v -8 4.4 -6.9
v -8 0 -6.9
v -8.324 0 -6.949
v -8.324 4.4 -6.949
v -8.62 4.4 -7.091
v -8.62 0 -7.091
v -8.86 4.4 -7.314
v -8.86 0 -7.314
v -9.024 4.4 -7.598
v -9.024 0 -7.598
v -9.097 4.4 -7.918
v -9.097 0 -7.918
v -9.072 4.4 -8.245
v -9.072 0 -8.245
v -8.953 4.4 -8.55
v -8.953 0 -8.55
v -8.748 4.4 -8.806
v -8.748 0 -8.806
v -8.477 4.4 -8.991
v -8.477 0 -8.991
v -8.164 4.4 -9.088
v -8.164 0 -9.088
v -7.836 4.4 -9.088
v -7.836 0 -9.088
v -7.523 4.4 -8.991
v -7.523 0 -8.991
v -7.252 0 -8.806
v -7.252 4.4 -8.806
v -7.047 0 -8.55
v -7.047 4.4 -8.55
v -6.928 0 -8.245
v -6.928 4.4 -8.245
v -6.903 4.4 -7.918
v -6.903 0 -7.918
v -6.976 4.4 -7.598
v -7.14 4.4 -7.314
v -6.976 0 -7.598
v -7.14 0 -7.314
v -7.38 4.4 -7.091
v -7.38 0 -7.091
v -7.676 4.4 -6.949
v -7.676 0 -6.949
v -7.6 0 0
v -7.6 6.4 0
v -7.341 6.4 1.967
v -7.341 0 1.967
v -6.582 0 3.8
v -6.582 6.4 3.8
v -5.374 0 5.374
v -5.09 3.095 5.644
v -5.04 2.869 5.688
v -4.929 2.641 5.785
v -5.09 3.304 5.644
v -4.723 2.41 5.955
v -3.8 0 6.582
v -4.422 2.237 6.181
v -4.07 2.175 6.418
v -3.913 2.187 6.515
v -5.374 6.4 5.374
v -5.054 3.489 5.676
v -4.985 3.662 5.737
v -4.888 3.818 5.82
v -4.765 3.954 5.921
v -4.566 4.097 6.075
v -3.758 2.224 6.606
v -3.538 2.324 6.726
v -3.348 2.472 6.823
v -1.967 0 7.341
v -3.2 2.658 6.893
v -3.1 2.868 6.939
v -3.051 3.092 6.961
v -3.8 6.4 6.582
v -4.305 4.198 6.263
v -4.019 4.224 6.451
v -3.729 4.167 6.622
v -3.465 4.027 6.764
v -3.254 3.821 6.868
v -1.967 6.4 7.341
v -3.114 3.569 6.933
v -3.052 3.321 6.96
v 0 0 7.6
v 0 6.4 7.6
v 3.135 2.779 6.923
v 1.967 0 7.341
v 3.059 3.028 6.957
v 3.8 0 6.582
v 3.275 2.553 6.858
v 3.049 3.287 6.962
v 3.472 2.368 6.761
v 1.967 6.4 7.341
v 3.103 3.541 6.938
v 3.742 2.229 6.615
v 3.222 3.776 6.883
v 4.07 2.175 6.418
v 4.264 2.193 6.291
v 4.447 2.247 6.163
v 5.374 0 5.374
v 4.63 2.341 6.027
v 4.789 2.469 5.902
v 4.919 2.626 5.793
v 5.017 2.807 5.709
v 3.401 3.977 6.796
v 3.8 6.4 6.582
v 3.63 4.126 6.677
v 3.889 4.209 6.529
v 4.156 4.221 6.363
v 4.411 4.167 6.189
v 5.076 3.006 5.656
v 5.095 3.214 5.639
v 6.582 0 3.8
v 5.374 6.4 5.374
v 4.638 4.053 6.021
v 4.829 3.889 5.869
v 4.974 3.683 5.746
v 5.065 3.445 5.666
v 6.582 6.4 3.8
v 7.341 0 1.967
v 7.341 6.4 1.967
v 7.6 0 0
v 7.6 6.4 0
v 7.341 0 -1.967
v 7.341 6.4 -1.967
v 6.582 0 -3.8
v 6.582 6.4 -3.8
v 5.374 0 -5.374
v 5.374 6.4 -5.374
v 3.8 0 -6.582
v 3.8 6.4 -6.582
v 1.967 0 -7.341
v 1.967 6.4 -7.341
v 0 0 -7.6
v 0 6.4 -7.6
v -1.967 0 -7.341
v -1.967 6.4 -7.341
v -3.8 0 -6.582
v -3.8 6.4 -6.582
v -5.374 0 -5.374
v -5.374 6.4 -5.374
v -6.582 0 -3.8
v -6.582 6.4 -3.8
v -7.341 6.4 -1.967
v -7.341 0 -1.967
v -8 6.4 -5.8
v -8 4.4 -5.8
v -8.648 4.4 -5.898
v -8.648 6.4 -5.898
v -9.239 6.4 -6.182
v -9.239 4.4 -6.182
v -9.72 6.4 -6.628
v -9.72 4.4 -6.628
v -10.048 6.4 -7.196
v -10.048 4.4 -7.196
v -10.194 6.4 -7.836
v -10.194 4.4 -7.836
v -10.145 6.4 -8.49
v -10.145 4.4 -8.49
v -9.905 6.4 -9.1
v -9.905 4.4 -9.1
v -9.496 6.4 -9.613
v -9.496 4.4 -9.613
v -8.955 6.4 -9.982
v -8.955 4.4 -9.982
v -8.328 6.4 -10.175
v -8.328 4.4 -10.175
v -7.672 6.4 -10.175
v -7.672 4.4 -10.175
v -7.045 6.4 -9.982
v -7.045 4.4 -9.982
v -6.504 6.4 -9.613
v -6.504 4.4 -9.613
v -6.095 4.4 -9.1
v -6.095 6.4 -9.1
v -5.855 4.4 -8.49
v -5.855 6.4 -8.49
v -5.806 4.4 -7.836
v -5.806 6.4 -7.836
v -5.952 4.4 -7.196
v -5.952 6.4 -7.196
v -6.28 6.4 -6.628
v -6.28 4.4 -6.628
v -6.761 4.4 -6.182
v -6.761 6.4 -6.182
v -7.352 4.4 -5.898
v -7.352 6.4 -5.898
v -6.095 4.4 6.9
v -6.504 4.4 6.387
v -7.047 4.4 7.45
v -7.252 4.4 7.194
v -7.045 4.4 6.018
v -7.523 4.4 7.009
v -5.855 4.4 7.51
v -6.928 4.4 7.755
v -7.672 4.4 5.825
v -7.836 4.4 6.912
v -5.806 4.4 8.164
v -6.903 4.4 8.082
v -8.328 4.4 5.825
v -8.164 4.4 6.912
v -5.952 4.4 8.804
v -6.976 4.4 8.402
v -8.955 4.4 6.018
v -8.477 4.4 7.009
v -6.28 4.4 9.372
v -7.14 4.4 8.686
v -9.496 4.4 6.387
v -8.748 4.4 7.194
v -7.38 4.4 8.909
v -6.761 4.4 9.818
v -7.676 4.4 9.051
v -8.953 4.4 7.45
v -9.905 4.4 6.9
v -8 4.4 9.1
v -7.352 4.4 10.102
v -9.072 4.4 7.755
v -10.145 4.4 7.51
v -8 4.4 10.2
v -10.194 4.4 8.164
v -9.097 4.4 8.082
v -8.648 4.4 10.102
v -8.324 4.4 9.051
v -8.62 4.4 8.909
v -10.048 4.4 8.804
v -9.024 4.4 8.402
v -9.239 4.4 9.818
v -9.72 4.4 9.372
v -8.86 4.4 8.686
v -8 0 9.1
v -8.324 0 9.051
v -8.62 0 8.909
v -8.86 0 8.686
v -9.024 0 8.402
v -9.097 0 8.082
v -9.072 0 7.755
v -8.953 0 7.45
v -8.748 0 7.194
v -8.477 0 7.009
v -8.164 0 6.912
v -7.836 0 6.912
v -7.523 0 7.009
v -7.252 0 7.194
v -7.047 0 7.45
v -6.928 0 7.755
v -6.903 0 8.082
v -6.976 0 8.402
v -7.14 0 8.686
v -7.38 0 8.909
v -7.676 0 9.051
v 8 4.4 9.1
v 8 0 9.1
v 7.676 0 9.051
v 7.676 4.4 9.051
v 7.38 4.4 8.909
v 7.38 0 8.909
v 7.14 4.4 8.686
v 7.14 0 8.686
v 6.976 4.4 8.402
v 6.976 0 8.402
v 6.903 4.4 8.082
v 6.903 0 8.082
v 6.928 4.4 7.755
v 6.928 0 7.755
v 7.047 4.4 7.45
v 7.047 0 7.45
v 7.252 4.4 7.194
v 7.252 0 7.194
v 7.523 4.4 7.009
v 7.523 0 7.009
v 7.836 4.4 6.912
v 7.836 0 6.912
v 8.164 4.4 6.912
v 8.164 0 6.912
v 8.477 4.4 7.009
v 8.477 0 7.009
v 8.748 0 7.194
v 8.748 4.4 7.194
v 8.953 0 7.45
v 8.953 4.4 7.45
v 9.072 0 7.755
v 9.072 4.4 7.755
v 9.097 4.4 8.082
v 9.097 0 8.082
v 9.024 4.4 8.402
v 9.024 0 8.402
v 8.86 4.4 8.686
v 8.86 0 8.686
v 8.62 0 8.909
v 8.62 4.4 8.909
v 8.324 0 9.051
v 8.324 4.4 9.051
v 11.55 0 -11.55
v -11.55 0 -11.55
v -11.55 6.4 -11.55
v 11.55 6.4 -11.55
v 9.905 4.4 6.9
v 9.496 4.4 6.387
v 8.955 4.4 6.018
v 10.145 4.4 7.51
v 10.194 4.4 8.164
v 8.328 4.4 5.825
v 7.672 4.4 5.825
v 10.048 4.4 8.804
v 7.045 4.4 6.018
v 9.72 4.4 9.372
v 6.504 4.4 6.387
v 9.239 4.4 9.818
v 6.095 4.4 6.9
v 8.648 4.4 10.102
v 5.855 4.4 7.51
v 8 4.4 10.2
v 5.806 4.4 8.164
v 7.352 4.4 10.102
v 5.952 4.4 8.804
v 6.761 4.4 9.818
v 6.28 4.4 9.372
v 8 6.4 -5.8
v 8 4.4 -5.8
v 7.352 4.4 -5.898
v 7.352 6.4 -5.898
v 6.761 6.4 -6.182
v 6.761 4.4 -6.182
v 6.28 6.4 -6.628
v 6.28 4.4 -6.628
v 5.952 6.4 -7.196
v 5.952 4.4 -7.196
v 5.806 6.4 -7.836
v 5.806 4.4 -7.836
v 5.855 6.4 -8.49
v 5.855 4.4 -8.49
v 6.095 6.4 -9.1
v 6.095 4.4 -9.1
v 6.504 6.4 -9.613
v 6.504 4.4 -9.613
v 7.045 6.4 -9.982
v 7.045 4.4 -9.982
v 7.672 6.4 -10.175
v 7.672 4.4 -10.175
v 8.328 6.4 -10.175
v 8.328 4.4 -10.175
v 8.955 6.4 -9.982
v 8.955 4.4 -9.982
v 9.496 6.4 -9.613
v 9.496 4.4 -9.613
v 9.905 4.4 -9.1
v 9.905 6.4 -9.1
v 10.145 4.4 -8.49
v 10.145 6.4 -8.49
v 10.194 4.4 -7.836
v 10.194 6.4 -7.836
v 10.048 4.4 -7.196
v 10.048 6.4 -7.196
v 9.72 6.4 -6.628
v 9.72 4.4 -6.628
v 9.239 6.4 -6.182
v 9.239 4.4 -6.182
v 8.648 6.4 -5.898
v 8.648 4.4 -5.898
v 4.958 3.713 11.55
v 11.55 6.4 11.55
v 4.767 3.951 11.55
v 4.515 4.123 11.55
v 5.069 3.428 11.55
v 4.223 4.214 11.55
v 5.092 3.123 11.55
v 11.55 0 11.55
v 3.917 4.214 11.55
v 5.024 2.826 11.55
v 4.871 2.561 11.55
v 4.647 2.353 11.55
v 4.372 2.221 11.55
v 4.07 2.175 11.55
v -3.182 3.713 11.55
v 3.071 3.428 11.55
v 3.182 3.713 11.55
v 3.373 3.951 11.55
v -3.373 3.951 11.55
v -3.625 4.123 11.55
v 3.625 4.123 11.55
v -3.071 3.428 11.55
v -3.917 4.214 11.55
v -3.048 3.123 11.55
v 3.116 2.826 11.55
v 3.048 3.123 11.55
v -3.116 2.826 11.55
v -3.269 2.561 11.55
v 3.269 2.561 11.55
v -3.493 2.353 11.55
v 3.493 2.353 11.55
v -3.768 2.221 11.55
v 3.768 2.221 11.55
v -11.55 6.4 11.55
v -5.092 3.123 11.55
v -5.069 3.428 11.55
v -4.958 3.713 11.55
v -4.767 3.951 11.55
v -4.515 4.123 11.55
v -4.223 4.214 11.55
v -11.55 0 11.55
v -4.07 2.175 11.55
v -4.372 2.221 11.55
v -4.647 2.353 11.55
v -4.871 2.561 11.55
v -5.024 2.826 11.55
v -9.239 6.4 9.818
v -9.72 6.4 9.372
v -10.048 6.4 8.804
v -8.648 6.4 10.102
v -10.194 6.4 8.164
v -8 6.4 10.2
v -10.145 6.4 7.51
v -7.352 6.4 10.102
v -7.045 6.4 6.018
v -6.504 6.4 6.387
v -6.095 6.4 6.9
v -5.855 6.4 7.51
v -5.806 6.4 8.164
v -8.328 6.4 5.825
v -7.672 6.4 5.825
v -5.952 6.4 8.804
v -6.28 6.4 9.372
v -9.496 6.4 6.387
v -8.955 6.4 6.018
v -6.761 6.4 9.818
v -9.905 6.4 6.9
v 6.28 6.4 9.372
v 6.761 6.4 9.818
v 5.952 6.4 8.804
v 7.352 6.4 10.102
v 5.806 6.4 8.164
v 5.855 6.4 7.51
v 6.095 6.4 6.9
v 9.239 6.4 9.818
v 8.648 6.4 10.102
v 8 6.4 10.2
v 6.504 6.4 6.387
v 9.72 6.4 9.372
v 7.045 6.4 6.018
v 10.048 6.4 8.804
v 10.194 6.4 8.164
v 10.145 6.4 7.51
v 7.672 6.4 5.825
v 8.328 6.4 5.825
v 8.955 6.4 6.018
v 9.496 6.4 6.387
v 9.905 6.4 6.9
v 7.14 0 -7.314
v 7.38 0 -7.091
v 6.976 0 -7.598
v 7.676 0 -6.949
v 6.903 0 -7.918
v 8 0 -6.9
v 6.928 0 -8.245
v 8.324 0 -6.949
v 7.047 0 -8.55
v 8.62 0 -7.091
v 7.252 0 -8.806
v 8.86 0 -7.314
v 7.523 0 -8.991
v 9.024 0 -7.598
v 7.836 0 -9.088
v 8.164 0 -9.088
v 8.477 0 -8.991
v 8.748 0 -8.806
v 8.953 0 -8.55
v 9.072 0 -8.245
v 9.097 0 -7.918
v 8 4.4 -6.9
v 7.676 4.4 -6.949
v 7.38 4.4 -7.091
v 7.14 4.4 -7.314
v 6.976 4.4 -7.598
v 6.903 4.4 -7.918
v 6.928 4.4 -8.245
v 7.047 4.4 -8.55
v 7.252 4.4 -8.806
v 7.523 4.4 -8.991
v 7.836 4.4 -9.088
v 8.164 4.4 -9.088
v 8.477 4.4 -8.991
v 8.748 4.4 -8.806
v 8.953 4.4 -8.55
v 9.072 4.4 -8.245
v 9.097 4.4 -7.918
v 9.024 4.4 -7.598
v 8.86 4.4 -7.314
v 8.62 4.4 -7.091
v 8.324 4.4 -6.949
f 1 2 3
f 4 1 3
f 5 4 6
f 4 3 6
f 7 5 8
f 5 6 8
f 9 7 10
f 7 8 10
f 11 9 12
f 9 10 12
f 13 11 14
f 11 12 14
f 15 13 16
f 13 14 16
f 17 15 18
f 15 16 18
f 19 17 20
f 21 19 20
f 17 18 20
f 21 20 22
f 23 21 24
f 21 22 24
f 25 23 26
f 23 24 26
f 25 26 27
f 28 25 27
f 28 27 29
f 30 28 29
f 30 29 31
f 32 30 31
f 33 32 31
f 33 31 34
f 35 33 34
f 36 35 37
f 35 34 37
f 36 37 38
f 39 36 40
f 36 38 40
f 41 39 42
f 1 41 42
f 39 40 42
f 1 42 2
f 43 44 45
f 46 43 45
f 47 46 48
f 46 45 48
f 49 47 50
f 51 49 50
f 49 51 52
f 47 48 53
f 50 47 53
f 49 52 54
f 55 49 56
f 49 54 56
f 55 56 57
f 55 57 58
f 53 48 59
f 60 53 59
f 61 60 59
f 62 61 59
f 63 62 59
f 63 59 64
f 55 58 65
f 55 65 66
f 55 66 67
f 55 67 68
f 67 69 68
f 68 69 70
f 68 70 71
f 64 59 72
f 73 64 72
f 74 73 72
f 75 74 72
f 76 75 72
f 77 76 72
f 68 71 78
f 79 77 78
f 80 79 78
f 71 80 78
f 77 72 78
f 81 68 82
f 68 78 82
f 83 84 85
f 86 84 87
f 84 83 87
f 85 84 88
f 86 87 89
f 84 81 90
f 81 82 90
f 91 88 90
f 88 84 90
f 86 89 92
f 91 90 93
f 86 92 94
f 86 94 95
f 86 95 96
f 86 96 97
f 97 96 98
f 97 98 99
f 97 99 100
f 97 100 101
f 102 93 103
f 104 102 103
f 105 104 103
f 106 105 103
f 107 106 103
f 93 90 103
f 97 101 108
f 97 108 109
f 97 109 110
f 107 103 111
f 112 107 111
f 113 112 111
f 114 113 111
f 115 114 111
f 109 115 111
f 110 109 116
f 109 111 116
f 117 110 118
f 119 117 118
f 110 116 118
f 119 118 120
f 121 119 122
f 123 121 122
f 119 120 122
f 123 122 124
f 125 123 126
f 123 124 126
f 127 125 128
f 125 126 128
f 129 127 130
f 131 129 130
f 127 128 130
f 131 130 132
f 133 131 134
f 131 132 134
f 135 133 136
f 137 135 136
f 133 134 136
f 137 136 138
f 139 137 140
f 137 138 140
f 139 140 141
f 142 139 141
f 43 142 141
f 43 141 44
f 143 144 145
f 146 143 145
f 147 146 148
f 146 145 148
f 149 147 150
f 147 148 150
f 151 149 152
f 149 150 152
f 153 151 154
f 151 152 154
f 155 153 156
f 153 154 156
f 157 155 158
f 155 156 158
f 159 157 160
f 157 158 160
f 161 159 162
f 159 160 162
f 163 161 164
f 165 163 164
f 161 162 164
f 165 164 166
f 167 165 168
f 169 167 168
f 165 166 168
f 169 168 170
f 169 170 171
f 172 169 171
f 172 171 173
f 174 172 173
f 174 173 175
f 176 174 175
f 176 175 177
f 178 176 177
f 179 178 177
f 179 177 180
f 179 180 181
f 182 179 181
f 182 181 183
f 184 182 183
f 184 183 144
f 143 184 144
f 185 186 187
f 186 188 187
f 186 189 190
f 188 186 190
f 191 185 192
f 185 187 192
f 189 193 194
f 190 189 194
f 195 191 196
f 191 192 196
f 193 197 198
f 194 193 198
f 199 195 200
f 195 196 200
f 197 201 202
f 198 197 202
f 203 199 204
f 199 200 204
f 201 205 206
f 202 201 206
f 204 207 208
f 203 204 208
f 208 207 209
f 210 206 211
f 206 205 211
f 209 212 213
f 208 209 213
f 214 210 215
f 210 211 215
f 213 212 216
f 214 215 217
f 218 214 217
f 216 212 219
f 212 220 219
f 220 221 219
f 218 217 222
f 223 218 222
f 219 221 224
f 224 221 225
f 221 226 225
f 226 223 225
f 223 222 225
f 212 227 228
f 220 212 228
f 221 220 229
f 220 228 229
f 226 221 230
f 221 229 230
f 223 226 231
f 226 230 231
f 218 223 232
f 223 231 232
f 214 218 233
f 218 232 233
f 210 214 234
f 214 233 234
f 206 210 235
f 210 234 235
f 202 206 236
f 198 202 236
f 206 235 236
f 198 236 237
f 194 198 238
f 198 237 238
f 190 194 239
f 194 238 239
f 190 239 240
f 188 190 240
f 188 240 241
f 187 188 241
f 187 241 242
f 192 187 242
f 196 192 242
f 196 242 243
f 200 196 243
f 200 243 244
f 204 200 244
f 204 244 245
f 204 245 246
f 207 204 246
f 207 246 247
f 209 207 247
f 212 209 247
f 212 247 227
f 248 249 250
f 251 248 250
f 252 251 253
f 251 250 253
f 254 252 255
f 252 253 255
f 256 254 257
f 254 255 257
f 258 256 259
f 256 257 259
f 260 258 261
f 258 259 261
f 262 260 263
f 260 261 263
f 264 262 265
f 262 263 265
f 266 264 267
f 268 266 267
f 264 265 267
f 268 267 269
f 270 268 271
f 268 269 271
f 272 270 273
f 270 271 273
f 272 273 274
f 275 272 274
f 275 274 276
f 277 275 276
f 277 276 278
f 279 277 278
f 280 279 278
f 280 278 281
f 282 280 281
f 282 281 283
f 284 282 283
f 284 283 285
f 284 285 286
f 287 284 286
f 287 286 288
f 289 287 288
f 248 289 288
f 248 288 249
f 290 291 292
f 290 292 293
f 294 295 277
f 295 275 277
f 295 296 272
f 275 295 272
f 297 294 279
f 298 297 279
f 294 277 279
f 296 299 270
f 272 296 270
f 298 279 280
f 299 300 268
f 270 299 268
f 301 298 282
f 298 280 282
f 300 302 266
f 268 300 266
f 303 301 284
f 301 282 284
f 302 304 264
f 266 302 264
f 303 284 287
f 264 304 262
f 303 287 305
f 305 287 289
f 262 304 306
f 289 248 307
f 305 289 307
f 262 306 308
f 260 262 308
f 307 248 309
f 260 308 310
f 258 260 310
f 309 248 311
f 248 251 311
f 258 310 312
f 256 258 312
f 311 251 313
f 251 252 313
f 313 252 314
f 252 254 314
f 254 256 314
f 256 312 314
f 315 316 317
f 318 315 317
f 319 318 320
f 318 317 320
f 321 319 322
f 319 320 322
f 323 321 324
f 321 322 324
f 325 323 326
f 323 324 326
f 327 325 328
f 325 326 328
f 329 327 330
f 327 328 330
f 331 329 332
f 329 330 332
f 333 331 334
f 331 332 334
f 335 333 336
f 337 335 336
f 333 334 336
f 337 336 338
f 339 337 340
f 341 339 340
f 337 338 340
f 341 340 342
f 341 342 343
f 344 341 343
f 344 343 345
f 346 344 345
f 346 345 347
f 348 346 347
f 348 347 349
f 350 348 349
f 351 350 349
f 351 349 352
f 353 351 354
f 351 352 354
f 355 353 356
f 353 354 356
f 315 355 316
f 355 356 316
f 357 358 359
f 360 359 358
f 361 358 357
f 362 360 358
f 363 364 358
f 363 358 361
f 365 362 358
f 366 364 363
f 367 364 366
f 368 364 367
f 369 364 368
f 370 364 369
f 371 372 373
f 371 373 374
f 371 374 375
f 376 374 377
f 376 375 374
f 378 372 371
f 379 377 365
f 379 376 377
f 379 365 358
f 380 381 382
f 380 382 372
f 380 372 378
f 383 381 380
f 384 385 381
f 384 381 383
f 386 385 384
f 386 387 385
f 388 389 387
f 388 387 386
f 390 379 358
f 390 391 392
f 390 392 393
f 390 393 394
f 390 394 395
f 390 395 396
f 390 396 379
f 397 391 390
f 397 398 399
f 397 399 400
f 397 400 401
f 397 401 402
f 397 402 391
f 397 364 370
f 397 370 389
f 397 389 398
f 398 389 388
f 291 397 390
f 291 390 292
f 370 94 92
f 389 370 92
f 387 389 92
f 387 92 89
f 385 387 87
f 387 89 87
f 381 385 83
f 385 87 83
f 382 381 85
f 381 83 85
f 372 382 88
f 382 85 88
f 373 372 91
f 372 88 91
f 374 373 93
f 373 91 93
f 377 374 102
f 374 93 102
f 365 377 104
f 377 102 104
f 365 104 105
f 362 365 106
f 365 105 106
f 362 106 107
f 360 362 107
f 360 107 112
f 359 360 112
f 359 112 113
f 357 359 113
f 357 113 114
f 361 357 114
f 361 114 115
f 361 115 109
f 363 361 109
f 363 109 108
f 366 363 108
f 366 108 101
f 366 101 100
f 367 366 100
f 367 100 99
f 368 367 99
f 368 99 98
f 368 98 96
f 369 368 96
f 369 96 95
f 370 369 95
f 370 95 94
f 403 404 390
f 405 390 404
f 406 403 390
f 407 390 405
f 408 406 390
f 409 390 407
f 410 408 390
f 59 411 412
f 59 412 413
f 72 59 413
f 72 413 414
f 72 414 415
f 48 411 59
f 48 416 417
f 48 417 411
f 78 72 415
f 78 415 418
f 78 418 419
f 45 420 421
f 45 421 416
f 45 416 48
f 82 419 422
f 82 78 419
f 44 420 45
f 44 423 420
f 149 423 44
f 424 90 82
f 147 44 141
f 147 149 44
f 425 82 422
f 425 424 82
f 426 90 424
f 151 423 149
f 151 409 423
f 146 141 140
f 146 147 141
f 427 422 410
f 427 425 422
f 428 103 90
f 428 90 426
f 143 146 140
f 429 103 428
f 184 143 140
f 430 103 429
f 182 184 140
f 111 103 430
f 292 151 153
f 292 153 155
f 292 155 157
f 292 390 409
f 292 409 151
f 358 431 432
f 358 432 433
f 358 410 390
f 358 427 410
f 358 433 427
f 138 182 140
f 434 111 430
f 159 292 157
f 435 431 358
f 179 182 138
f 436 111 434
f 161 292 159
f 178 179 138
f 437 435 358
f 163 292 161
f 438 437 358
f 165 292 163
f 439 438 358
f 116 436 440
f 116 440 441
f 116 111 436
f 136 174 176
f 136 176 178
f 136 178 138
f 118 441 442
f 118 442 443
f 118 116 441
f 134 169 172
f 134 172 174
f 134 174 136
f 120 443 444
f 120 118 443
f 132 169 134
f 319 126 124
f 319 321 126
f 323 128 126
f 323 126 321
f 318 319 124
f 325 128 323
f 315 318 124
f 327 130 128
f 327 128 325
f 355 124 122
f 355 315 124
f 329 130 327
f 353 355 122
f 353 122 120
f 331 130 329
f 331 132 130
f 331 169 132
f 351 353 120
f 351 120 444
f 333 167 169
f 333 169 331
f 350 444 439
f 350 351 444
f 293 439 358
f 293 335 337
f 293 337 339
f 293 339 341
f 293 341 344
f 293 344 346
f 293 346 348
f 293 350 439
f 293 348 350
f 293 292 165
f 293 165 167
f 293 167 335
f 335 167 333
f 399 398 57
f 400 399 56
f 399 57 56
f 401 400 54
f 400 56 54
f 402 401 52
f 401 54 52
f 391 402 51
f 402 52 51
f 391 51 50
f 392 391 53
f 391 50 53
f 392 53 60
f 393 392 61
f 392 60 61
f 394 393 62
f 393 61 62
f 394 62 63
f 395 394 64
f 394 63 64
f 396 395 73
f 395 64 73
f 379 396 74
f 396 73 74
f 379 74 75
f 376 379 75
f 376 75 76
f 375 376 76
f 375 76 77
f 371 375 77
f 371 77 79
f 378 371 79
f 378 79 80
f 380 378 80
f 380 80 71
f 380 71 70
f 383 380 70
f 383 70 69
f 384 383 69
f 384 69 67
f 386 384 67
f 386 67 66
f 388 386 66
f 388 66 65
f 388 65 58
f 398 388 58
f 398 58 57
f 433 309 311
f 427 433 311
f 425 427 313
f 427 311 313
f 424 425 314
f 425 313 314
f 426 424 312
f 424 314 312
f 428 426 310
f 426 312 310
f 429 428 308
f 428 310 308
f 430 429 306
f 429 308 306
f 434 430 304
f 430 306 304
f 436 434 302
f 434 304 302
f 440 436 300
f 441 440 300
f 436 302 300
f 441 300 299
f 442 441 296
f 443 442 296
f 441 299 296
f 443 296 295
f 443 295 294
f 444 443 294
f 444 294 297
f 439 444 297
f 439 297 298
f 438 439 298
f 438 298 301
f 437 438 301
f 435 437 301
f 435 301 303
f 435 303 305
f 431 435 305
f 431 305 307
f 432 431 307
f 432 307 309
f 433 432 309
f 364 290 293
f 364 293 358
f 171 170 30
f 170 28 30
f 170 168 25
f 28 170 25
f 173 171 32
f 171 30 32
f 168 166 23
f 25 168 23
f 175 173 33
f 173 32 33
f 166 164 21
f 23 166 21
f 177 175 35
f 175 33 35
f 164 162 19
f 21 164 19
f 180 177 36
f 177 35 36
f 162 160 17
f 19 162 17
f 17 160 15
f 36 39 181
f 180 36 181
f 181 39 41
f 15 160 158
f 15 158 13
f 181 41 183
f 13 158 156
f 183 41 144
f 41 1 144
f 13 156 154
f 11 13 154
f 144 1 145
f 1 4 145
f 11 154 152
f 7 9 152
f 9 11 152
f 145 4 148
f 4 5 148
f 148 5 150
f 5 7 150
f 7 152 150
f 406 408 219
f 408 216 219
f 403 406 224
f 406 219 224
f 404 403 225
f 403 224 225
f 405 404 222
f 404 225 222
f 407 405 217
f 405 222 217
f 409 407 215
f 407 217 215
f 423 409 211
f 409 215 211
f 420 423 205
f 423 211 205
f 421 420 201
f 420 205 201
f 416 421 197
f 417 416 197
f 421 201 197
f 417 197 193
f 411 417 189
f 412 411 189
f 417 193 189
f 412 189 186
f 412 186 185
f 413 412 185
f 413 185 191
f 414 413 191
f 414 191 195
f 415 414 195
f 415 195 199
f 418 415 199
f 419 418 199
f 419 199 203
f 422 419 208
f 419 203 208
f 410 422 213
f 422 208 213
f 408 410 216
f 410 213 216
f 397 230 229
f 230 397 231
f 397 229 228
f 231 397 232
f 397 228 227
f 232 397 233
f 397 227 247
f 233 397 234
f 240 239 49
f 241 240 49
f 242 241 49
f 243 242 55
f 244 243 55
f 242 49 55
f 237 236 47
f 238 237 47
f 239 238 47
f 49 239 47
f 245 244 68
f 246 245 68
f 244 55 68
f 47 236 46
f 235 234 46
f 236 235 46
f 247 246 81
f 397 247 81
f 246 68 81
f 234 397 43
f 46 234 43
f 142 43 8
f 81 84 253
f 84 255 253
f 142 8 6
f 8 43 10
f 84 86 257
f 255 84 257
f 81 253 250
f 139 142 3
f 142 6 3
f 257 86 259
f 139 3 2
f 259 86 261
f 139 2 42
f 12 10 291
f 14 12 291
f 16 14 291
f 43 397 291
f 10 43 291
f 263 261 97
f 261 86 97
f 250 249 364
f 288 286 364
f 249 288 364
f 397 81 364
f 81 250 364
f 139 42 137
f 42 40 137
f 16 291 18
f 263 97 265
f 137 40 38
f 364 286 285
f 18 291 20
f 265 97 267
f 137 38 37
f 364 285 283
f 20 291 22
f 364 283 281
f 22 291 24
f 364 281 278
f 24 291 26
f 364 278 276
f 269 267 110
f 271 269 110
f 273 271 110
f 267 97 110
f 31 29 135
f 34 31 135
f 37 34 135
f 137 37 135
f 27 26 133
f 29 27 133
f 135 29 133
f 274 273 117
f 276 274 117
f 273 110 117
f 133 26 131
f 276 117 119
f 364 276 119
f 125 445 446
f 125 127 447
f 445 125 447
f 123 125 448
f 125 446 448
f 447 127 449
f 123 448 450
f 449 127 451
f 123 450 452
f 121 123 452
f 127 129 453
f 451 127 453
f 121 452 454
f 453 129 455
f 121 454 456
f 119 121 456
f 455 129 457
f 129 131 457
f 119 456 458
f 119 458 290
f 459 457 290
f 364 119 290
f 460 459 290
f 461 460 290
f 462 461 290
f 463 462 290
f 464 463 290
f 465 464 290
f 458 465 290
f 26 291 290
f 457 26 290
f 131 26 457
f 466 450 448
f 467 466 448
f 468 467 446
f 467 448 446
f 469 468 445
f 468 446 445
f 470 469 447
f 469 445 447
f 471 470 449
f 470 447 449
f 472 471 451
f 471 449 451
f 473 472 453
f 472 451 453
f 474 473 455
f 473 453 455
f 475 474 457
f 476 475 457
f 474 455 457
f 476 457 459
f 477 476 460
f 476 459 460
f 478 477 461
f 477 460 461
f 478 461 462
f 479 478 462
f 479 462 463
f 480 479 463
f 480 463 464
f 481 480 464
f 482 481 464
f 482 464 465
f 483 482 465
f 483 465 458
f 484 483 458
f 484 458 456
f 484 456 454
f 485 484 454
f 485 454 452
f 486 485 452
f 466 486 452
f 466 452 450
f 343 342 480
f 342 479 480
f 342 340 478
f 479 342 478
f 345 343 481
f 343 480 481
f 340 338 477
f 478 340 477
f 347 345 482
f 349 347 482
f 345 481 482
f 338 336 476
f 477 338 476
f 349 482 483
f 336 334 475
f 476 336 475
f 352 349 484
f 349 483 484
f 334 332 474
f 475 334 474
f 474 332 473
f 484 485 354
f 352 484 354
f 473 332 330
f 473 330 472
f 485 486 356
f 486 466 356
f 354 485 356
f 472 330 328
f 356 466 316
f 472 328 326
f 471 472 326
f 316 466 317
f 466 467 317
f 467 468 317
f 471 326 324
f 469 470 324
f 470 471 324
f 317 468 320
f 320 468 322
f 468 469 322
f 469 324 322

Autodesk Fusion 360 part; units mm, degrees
sketch "Sketch1" plane through (0, 0, 0) normal (0, 1, 0) x (1, 0, 0)
  line L0 (11.55, -11.55) -> (-11.55, -11.55)
  line L1 (-11.55, -11.55) -> (-11.55, 11.55)
  line L2 (-11.55, 11.55) -> (11.55, 11.55)
  line L3 (11.55, 11.55) -> (11.55, -11.55)
  line L4 (11.55, -11.55) -> (-11.55, 11.55) construction
  line L5 (-11.55, -11.55) -> (11.55, 11.55) construction
  dimension "d1" = 23.1
  dimension "d2" = 23.1
extrude "Extrude1" add sketch "Sketch1" along normal blind 6.4
sketch "Sketch2" plane through (0, 6.4, 0) normal (0, 1, 0) x (-1, 0, 0)
  line L0 (-11.55, -11.55) -> (11.55, -11.55)
  line L1 (11.55, -11.55) -> (11.55, 11.55)
  line L2 (11.55, 11.55) -> (-11.55, 11.55)
  line L3 (-11.55, 11.55) -> (-11.55, -11.55)
  line L4 (-8, 8) -> (8, 8) construction
  line L5 (8, 8) -> (8, -8) construction
  line L6 (8, -8) -> (-8, -8) construction
  line L7 (-8, -8) -> (-8, 8) construction
  line L8 (-8, 8) -> (8, -8) construction
  line L9 (8, 8) -> (-8, -8) construction
  circle A0 centre (0, 0) radius 7.6
  point P0 (8, -8)
  point P1 (-8, -8)
  point P2 (-8, 8)
  point P3 (8, 8)
  dimension "d5" = 16
  dimension "d6" = 16
  dimension "d7" = 15.2
hole "Hole1" at (-8, 6.4, -8) direction (0, -1, 0) diameter 2.2 end through all counterbore diameter 4.4 counterbore depth 2
hole "Hole2" at (8, 6.4, -8) direction (0, -1, 0) diameter 2.2 end through all counterbore diameter 4.4 counterbore depth 2
hole "Hole3" at (8, 6.4, 8) direction (0, -1, 0) diameter 2.2 end through all counterbore diameter 4.4 counterbore depth 2
hole "Hole4" at (-8, 6.4, 8) direction (0, -1, 0) diameter 2.2 end through all counterbore diameter 4.4 counterbore depth 2
extrude "Extrude2" cut sketch "Sketch2" along normal through all and the other way through all contours A0
sketch "Sketch3" plane through (0, 0, 11.55) normal (0, 0, 1) x (1, 0, 0)
  line L0 (-11.55, 0) -> (11.55, 0)
  line L1 (11.55, 0) -> (11.55, 6.4)
  line L2 (11.55, 6.4) -> (-11.55, 6.4)
  line L3 (-11.55, 6.4) -> (-11.55, 0)
  line L4 (-11.55, 3.2) -> (11.55, 3.2) construction
  point P0 (-4.15, 3.2)
  point P1 (3.99, 3.2)
  dimension "d29" = 8.14
  dimension "d30" = 7.4
hole "Hole5" at (-4.07, 3.2, 11.55) direction (0, 0, -1) diameter 2.05 depth 7 tip angle 118
hole "Hole6" at (4.07, 3.2, 11.55) direction (0, 0, -1) diameter 2.05 depth 7 tip angle 118
